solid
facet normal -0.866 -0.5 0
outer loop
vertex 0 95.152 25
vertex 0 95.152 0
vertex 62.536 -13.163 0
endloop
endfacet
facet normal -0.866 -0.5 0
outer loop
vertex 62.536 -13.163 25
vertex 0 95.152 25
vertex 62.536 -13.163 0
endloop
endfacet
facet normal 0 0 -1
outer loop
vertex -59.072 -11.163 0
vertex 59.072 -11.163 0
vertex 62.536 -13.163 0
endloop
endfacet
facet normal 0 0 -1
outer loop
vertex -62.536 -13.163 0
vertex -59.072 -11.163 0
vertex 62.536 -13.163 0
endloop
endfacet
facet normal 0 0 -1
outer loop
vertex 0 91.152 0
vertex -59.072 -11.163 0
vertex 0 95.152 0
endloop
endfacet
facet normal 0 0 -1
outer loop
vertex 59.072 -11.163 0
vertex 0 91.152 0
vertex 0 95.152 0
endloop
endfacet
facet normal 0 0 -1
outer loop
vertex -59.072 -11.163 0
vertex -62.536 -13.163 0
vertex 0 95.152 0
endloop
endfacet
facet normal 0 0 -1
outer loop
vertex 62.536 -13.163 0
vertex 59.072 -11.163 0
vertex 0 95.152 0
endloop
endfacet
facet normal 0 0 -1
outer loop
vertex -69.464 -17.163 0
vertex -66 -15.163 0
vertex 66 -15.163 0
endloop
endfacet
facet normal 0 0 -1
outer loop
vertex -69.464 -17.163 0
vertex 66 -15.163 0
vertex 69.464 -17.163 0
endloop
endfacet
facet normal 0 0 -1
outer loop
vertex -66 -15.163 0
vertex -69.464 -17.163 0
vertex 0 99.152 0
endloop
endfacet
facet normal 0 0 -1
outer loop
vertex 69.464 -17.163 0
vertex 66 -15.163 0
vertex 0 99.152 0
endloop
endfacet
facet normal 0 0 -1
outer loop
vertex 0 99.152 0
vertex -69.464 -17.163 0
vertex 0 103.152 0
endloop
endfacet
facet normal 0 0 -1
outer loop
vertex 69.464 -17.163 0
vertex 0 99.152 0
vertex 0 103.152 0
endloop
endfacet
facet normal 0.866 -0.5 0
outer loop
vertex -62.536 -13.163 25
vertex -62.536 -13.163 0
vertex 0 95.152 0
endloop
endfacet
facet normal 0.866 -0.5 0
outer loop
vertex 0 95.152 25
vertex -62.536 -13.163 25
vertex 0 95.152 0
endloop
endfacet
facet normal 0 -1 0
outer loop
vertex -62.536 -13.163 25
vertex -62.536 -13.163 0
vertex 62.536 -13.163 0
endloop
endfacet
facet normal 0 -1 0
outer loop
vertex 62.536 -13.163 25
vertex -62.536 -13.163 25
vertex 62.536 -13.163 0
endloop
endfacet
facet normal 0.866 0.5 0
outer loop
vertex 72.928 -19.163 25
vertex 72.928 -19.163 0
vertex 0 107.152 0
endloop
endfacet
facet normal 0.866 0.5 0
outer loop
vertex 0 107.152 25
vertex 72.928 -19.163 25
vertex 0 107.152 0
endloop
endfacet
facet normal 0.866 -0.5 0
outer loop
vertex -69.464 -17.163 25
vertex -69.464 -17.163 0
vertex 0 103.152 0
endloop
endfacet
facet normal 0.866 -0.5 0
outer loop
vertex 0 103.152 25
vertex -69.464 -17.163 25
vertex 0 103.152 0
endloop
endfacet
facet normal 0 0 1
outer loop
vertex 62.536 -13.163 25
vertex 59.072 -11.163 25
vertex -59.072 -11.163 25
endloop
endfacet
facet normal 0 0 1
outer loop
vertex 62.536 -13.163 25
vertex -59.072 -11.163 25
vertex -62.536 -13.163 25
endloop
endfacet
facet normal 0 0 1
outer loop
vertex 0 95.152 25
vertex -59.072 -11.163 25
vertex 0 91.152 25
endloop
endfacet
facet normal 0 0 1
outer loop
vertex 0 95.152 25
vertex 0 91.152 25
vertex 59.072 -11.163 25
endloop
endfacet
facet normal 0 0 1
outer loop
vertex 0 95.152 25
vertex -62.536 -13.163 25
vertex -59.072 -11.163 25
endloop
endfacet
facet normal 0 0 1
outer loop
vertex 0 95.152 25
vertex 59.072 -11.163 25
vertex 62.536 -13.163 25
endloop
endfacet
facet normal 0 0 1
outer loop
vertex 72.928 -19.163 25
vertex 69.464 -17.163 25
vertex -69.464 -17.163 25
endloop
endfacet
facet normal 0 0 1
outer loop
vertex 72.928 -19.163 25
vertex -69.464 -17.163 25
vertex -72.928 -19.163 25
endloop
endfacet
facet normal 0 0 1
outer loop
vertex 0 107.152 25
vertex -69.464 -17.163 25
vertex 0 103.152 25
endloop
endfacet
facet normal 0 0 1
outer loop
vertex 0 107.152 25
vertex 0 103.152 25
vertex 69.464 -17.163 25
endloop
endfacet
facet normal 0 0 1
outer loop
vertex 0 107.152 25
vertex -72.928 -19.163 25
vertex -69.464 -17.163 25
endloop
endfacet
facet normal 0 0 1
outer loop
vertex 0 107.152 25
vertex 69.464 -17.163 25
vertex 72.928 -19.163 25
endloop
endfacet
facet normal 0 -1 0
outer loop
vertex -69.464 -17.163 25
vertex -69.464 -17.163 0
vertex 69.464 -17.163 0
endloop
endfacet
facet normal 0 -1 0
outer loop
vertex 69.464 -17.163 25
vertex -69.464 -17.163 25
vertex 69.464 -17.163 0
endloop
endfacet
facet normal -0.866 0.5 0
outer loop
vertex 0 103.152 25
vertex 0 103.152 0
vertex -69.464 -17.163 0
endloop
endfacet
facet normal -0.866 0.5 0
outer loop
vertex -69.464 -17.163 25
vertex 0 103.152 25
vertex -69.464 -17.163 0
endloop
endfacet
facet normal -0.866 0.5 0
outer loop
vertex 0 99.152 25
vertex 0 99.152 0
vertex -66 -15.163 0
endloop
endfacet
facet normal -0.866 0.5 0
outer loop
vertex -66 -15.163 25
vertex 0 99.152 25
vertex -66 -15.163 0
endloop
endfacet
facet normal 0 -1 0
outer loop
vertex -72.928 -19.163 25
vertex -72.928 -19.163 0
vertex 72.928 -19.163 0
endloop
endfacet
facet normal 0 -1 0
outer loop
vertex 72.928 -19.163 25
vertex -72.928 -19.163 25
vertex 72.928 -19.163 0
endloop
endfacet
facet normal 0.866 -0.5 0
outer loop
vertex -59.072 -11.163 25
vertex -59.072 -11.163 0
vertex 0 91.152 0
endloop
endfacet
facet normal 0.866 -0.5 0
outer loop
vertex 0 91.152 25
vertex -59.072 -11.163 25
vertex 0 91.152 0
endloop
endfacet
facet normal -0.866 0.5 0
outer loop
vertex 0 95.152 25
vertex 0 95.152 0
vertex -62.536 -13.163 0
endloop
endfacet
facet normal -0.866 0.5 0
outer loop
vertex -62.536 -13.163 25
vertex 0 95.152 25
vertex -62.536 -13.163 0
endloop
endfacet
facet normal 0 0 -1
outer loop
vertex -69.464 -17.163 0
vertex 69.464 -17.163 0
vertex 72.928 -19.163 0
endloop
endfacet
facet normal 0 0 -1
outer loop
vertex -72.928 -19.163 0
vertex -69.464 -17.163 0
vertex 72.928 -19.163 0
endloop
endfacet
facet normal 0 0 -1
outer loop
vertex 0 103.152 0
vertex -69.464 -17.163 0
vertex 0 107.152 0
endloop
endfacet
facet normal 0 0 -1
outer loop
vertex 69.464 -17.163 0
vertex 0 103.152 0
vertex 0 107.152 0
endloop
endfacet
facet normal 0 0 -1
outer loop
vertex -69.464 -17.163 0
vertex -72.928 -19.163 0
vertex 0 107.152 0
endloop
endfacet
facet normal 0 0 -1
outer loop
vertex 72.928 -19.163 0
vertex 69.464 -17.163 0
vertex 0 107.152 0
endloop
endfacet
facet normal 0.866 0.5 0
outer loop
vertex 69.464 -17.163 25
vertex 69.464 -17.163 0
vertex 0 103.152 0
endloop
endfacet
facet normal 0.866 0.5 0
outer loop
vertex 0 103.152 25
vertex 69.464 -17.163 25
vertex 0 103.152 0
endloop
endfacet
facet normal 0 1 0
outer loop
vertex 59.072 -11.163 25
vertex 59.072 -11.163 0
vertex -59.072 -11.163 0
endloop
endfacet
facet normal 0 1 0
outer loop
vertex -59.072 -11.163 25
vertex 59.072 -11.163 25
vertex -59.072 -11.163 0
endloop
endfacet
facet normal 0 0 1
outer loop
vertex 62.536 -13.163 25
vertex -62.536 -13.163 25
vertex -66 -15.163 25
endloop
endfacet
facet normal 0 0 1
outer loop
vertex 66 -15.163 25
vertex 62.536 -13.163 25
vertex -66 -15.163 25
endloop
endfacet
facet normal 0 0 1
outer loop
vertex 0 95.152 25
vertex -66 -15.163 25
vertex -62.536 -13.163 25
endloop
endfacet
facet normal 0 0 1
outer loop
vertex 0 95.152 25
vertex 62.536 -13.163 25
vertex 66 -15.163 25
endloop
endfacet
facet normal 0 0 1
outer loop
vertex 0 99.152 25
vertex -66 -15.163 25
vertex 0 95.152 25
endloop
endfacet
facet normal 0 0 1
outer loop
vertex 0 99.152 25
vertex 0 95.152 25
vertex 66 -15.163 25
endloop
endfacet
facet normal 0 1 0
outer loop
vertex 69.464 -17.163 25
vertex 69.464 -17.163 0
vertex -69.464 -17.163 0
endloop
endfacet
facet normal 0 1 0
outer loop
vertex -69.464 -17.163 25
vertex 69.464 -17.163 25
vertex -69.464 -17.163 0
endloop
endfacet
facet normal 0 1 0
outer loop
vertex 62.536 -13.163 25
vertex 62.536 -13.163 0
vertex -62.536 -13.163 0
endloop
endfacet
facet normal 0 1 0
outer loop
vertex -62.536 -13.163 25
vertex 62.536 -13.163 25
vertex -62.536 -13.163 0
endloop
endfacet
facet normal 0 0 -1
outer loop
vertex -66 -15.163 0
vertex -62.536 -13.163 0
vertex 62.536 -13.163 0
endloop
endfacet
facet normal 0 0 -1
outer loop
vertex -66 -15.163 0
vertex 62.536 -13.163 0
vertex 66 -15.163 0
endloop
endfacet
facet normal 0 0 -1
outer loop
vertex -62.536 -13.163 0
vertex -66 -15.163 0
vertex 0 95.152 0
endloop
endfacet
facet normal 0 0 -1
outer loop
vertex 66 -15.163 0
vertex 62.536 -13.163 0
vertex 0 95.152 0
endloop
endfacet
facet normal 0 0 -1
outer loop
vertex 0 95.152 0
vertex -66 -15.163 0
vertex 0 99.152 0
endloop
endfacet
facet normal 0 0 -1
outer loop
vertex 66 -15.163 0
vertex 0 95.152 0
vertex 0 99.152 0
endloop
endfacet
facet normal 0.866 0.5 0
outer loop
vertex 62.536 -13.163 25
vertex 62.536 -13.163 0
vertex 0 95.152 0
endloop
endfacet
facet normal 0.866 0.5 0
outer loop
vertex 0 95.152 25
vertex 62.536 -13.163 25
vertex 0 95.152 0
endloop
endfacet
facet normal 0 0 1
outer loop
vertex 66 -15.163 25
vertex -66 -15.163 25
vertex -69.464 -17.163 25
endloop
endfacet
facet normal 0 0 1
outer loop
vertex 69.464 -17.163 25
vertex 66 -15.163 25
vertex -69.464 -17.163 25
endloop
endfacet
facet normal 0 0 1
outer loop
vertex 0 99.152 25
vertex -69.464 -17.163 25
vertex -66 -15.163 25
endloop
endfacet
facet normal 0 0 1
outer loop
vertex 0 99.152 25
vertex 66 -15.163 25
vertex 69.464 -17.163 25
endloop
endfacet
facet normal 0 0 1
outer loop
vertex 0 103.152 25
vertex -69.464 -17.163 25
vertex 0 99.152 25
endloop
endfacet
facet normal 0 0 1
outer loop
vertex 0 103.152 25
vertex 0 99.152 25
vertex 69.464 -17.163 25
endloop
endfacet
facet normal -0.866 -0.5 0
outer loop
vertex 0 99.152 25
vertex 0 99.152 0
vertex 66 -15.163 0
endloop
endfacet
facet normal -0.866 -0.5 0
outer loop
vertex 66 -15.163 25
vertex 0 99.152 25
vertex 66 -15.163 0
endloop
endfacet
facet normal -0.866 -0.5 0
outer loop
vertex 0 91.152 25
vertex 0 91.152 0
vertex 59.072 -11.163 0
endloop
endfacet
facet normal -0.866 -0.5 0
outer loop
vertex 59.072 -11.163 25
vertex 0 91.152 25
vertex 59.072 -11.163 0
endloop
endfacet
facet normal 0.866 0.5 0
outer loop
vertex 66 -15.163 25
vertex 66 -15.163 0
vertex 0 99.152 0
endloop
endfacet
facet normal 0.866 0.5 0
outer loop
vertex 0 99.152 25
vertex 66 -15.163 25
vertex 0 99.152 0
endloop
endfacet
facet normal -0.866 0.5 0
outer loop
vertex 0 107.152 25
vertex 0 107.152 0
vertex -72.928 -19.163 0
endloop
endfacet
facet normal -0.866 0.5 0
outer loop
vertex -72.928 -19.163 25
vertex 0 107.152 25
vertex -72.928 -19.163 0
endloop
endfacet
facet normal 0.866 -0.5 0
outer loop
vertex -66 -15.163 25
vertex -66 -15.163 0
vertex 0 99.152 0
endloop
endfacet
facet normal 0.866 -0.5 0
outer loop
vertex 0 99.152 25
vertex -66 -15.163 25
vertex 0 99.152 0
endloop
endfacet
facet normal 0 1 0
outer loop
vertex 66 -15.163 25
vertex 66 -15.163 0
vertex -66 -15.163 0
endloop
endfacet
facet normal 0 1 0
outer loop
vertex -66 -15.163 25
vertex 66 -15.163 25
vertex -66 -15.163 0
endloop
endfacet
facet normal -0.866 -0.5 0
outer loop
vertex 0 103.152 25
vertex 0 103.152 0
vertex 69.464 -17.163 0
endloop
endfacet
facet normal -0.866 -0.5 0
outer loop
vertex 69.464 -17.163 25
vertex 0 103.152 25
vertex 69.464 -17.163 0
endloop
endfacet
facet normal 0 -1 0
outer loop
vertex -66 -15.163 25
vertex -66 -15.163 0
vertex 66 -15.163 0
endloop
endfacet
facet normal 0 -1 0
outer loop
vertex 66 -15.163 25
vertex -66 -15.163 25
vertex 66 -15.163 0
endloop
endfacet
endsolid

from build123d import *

# Parameters (mm, degrees)
F2_DEPTH = 25
F3_DEPTH = 25
F4_DEPTH = 25
F5_DEPTH = 25


with BuildPart() as f2:
    # F1 (on Top) → F2 (new body)
    with BuildSketch(Plane.XY):
        Polygon((72.928203, -19.162993), (0, 107.152361), (-72.928203, -19.162993), align=None)
        Polygon((-69.464102, -17.162993), (0, 103.152361), (69.464102, -17.162993), align=None, mode=Mode.SUBTRACT)
    extrude(amount=F2_DEPTH)


with BuildPart() as f3:
    # F1 (on Top) → F3 (new body)
    with BuildSketch(Plane.XY):
        Polygon((69.464102, -17.162993), (0, 103.152361), (-69.464102, -17.162993), align=None)
        Polygon((66, -15.162993), (-66, -15.162993), (0, 99.152361), align=None, mode=Mode.SUBTRACT)
    extrude(amount=F3_DEPTH)


with BuildPart() as f4:
    # F1 (on Top) → F4 (new body)
    with BuildSketch(Plane.XY):
        Polygon((0, 95.152361), (-62.535898, -13.162993), (62.535898, -13.162993), align=None)
        Polygon((-59.071797, -11.162993), (0, 91.152361), (59.071797, -11.162993), align=None, mode=Mode.SUBTRACT)
    extrude(amount=F4_DEPTH)


with BuildPart() as f5:
    # F1 (on Top) → F5 (new body)
    with BuildSketch(Plane.XY):
        Polygon((0, 99.152361), (-66, -15.162993), (66, -15.162993), align=None)
        Polygon((62.535898, -13.162993), (-62.535898, -13.162993), (0, 95.152361), align=None, mode=Mode.SUBTRACT)
    extrude(amount=F5_DEPTH)


solid = Compound([f2.part, f3.part, f4.part, f5.part])
